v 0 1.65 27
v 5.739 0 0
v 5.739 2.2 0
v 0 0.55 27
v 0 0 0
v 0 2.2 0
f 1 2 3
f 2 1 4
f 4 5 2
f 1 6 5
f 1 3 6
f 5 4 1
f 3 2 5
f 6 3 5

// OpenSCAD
//Copyright Austin Floyd 2013
//http://www.thingiverse.com/thing:119050
//license GNU GPL
//austin.floyd at 3DprintGeeks (dot) com

//global variables.. if not set when calling wedge it will use these values. 
//The prefix st_ is to "namespace" the global variables so they're not accidentally overridden elsewhere


//The top angle of the right triangle
st_wedgeAngle=12; // [0.01:89.99]

//The height of the triangle (width auto-generated based on this)
st_wedgeHeight=27; // [0.01:200]

//Depth (thickness) of triangle
st_wedgeWidth=2.2; // [0.01:200]

//Increased or decreased percentage (50% would be 0.5) of top point vs bottom point
st_topFactor=0.5; // [0,0.1,0.2,0.3,0.4,0.5,0.6,0.7,0.8,0.9,1]

//Whether or not to center on x/y/z
st_center=false; // [true, false]

//Flip it upside down
st_invert=false; // [true, false]

//default wedge
wedge();

//demo of several different wedges
//demo();
module demo() {
	translate([0,0,15])
	wedge(angle=75,height=10, wedgeWidth=5);

	wedge(angle=75,height=5,topFactor=.25, center=true, wedgeWidth=10);

	translate([0,0,-15])
	wedge(angle=35,height=13,center=true);

	translate([0,0,-30])
	wedge(angle=35,height=6, center=true, invert=true);
}


module wedge(angle=st_wedgeAngle, height=st_wedgeHeight, wedgeWidth=st_wedgeWidth, topFactor=st_topFactor, center=st_center, invert=st_invert) {
	angle2=180-90-angle;
	hyp=height/sin(angle2);
	width=sqrt(pow(hyp,2)-pow(height,2));
	if (!invert) {
		triangle(height, width, center, topFactor, wedgeWidth);
	}
	if (invert) {
		rotate(180,[1,0,0])
		triangle(height, width, center, topFactor, wedgeWidth);
	}
}
module triangle(height=5, width=5, center=false, topFactor=0.5, wedgeWidth) {
	triangles=[[0,1,4],[5,4,1],		// top
					[1,2,5],[2,3,4],		// sides
					[3,0,4], [4,5,2],	//back
           	[2,1,0], [2,0,3]]; // base
	halfWidth=width/2;
	halfWWidth=wedgeWidth/2;
	topWidth=wedgeWidth*topFactor;
	halfTopWidth=topWidth/2;
	topHalfDiff=(wedgeWidth-topWidth)/2;
	halfHeight=height/2;
	if (center) {
		polyhedron(
  			points=[/*0*/[halfWidth,halfWWidth,-halfHeight],/*1*/[halfWidth,-halfWWidth,-halfHeight],				//front point
					  /*2*/[-halfWidth,-halfWWidth,-halfHeight],       /*3*/[-halfWidth,halfWWidth,-halfHeight], //rear point
           	  /*4*/[-halfWidth,halfTopWidth,height-halfHeight], /*5*/[-halfWidth,-halfTopWidth,height-halfHeight] ], //front/rear top 
  			triangles=triangles
		);
	}
	else {
		polyhedron(
  			points=[/*0*/[width,wedgeWidth,0],         			 /*1*/[width,0,0],				    ////front point
					  /*2*/[0,0,0],       					  			 /*3*/[0,wedgeWidth,0], 		    //rear point
           	  /*4*/[0,wedgeWidth-topHalfDiff,height],/*5*/[0,topHalfDiff,height] ],//front/back top 
  			triangles=triangles
		);
	}
}
